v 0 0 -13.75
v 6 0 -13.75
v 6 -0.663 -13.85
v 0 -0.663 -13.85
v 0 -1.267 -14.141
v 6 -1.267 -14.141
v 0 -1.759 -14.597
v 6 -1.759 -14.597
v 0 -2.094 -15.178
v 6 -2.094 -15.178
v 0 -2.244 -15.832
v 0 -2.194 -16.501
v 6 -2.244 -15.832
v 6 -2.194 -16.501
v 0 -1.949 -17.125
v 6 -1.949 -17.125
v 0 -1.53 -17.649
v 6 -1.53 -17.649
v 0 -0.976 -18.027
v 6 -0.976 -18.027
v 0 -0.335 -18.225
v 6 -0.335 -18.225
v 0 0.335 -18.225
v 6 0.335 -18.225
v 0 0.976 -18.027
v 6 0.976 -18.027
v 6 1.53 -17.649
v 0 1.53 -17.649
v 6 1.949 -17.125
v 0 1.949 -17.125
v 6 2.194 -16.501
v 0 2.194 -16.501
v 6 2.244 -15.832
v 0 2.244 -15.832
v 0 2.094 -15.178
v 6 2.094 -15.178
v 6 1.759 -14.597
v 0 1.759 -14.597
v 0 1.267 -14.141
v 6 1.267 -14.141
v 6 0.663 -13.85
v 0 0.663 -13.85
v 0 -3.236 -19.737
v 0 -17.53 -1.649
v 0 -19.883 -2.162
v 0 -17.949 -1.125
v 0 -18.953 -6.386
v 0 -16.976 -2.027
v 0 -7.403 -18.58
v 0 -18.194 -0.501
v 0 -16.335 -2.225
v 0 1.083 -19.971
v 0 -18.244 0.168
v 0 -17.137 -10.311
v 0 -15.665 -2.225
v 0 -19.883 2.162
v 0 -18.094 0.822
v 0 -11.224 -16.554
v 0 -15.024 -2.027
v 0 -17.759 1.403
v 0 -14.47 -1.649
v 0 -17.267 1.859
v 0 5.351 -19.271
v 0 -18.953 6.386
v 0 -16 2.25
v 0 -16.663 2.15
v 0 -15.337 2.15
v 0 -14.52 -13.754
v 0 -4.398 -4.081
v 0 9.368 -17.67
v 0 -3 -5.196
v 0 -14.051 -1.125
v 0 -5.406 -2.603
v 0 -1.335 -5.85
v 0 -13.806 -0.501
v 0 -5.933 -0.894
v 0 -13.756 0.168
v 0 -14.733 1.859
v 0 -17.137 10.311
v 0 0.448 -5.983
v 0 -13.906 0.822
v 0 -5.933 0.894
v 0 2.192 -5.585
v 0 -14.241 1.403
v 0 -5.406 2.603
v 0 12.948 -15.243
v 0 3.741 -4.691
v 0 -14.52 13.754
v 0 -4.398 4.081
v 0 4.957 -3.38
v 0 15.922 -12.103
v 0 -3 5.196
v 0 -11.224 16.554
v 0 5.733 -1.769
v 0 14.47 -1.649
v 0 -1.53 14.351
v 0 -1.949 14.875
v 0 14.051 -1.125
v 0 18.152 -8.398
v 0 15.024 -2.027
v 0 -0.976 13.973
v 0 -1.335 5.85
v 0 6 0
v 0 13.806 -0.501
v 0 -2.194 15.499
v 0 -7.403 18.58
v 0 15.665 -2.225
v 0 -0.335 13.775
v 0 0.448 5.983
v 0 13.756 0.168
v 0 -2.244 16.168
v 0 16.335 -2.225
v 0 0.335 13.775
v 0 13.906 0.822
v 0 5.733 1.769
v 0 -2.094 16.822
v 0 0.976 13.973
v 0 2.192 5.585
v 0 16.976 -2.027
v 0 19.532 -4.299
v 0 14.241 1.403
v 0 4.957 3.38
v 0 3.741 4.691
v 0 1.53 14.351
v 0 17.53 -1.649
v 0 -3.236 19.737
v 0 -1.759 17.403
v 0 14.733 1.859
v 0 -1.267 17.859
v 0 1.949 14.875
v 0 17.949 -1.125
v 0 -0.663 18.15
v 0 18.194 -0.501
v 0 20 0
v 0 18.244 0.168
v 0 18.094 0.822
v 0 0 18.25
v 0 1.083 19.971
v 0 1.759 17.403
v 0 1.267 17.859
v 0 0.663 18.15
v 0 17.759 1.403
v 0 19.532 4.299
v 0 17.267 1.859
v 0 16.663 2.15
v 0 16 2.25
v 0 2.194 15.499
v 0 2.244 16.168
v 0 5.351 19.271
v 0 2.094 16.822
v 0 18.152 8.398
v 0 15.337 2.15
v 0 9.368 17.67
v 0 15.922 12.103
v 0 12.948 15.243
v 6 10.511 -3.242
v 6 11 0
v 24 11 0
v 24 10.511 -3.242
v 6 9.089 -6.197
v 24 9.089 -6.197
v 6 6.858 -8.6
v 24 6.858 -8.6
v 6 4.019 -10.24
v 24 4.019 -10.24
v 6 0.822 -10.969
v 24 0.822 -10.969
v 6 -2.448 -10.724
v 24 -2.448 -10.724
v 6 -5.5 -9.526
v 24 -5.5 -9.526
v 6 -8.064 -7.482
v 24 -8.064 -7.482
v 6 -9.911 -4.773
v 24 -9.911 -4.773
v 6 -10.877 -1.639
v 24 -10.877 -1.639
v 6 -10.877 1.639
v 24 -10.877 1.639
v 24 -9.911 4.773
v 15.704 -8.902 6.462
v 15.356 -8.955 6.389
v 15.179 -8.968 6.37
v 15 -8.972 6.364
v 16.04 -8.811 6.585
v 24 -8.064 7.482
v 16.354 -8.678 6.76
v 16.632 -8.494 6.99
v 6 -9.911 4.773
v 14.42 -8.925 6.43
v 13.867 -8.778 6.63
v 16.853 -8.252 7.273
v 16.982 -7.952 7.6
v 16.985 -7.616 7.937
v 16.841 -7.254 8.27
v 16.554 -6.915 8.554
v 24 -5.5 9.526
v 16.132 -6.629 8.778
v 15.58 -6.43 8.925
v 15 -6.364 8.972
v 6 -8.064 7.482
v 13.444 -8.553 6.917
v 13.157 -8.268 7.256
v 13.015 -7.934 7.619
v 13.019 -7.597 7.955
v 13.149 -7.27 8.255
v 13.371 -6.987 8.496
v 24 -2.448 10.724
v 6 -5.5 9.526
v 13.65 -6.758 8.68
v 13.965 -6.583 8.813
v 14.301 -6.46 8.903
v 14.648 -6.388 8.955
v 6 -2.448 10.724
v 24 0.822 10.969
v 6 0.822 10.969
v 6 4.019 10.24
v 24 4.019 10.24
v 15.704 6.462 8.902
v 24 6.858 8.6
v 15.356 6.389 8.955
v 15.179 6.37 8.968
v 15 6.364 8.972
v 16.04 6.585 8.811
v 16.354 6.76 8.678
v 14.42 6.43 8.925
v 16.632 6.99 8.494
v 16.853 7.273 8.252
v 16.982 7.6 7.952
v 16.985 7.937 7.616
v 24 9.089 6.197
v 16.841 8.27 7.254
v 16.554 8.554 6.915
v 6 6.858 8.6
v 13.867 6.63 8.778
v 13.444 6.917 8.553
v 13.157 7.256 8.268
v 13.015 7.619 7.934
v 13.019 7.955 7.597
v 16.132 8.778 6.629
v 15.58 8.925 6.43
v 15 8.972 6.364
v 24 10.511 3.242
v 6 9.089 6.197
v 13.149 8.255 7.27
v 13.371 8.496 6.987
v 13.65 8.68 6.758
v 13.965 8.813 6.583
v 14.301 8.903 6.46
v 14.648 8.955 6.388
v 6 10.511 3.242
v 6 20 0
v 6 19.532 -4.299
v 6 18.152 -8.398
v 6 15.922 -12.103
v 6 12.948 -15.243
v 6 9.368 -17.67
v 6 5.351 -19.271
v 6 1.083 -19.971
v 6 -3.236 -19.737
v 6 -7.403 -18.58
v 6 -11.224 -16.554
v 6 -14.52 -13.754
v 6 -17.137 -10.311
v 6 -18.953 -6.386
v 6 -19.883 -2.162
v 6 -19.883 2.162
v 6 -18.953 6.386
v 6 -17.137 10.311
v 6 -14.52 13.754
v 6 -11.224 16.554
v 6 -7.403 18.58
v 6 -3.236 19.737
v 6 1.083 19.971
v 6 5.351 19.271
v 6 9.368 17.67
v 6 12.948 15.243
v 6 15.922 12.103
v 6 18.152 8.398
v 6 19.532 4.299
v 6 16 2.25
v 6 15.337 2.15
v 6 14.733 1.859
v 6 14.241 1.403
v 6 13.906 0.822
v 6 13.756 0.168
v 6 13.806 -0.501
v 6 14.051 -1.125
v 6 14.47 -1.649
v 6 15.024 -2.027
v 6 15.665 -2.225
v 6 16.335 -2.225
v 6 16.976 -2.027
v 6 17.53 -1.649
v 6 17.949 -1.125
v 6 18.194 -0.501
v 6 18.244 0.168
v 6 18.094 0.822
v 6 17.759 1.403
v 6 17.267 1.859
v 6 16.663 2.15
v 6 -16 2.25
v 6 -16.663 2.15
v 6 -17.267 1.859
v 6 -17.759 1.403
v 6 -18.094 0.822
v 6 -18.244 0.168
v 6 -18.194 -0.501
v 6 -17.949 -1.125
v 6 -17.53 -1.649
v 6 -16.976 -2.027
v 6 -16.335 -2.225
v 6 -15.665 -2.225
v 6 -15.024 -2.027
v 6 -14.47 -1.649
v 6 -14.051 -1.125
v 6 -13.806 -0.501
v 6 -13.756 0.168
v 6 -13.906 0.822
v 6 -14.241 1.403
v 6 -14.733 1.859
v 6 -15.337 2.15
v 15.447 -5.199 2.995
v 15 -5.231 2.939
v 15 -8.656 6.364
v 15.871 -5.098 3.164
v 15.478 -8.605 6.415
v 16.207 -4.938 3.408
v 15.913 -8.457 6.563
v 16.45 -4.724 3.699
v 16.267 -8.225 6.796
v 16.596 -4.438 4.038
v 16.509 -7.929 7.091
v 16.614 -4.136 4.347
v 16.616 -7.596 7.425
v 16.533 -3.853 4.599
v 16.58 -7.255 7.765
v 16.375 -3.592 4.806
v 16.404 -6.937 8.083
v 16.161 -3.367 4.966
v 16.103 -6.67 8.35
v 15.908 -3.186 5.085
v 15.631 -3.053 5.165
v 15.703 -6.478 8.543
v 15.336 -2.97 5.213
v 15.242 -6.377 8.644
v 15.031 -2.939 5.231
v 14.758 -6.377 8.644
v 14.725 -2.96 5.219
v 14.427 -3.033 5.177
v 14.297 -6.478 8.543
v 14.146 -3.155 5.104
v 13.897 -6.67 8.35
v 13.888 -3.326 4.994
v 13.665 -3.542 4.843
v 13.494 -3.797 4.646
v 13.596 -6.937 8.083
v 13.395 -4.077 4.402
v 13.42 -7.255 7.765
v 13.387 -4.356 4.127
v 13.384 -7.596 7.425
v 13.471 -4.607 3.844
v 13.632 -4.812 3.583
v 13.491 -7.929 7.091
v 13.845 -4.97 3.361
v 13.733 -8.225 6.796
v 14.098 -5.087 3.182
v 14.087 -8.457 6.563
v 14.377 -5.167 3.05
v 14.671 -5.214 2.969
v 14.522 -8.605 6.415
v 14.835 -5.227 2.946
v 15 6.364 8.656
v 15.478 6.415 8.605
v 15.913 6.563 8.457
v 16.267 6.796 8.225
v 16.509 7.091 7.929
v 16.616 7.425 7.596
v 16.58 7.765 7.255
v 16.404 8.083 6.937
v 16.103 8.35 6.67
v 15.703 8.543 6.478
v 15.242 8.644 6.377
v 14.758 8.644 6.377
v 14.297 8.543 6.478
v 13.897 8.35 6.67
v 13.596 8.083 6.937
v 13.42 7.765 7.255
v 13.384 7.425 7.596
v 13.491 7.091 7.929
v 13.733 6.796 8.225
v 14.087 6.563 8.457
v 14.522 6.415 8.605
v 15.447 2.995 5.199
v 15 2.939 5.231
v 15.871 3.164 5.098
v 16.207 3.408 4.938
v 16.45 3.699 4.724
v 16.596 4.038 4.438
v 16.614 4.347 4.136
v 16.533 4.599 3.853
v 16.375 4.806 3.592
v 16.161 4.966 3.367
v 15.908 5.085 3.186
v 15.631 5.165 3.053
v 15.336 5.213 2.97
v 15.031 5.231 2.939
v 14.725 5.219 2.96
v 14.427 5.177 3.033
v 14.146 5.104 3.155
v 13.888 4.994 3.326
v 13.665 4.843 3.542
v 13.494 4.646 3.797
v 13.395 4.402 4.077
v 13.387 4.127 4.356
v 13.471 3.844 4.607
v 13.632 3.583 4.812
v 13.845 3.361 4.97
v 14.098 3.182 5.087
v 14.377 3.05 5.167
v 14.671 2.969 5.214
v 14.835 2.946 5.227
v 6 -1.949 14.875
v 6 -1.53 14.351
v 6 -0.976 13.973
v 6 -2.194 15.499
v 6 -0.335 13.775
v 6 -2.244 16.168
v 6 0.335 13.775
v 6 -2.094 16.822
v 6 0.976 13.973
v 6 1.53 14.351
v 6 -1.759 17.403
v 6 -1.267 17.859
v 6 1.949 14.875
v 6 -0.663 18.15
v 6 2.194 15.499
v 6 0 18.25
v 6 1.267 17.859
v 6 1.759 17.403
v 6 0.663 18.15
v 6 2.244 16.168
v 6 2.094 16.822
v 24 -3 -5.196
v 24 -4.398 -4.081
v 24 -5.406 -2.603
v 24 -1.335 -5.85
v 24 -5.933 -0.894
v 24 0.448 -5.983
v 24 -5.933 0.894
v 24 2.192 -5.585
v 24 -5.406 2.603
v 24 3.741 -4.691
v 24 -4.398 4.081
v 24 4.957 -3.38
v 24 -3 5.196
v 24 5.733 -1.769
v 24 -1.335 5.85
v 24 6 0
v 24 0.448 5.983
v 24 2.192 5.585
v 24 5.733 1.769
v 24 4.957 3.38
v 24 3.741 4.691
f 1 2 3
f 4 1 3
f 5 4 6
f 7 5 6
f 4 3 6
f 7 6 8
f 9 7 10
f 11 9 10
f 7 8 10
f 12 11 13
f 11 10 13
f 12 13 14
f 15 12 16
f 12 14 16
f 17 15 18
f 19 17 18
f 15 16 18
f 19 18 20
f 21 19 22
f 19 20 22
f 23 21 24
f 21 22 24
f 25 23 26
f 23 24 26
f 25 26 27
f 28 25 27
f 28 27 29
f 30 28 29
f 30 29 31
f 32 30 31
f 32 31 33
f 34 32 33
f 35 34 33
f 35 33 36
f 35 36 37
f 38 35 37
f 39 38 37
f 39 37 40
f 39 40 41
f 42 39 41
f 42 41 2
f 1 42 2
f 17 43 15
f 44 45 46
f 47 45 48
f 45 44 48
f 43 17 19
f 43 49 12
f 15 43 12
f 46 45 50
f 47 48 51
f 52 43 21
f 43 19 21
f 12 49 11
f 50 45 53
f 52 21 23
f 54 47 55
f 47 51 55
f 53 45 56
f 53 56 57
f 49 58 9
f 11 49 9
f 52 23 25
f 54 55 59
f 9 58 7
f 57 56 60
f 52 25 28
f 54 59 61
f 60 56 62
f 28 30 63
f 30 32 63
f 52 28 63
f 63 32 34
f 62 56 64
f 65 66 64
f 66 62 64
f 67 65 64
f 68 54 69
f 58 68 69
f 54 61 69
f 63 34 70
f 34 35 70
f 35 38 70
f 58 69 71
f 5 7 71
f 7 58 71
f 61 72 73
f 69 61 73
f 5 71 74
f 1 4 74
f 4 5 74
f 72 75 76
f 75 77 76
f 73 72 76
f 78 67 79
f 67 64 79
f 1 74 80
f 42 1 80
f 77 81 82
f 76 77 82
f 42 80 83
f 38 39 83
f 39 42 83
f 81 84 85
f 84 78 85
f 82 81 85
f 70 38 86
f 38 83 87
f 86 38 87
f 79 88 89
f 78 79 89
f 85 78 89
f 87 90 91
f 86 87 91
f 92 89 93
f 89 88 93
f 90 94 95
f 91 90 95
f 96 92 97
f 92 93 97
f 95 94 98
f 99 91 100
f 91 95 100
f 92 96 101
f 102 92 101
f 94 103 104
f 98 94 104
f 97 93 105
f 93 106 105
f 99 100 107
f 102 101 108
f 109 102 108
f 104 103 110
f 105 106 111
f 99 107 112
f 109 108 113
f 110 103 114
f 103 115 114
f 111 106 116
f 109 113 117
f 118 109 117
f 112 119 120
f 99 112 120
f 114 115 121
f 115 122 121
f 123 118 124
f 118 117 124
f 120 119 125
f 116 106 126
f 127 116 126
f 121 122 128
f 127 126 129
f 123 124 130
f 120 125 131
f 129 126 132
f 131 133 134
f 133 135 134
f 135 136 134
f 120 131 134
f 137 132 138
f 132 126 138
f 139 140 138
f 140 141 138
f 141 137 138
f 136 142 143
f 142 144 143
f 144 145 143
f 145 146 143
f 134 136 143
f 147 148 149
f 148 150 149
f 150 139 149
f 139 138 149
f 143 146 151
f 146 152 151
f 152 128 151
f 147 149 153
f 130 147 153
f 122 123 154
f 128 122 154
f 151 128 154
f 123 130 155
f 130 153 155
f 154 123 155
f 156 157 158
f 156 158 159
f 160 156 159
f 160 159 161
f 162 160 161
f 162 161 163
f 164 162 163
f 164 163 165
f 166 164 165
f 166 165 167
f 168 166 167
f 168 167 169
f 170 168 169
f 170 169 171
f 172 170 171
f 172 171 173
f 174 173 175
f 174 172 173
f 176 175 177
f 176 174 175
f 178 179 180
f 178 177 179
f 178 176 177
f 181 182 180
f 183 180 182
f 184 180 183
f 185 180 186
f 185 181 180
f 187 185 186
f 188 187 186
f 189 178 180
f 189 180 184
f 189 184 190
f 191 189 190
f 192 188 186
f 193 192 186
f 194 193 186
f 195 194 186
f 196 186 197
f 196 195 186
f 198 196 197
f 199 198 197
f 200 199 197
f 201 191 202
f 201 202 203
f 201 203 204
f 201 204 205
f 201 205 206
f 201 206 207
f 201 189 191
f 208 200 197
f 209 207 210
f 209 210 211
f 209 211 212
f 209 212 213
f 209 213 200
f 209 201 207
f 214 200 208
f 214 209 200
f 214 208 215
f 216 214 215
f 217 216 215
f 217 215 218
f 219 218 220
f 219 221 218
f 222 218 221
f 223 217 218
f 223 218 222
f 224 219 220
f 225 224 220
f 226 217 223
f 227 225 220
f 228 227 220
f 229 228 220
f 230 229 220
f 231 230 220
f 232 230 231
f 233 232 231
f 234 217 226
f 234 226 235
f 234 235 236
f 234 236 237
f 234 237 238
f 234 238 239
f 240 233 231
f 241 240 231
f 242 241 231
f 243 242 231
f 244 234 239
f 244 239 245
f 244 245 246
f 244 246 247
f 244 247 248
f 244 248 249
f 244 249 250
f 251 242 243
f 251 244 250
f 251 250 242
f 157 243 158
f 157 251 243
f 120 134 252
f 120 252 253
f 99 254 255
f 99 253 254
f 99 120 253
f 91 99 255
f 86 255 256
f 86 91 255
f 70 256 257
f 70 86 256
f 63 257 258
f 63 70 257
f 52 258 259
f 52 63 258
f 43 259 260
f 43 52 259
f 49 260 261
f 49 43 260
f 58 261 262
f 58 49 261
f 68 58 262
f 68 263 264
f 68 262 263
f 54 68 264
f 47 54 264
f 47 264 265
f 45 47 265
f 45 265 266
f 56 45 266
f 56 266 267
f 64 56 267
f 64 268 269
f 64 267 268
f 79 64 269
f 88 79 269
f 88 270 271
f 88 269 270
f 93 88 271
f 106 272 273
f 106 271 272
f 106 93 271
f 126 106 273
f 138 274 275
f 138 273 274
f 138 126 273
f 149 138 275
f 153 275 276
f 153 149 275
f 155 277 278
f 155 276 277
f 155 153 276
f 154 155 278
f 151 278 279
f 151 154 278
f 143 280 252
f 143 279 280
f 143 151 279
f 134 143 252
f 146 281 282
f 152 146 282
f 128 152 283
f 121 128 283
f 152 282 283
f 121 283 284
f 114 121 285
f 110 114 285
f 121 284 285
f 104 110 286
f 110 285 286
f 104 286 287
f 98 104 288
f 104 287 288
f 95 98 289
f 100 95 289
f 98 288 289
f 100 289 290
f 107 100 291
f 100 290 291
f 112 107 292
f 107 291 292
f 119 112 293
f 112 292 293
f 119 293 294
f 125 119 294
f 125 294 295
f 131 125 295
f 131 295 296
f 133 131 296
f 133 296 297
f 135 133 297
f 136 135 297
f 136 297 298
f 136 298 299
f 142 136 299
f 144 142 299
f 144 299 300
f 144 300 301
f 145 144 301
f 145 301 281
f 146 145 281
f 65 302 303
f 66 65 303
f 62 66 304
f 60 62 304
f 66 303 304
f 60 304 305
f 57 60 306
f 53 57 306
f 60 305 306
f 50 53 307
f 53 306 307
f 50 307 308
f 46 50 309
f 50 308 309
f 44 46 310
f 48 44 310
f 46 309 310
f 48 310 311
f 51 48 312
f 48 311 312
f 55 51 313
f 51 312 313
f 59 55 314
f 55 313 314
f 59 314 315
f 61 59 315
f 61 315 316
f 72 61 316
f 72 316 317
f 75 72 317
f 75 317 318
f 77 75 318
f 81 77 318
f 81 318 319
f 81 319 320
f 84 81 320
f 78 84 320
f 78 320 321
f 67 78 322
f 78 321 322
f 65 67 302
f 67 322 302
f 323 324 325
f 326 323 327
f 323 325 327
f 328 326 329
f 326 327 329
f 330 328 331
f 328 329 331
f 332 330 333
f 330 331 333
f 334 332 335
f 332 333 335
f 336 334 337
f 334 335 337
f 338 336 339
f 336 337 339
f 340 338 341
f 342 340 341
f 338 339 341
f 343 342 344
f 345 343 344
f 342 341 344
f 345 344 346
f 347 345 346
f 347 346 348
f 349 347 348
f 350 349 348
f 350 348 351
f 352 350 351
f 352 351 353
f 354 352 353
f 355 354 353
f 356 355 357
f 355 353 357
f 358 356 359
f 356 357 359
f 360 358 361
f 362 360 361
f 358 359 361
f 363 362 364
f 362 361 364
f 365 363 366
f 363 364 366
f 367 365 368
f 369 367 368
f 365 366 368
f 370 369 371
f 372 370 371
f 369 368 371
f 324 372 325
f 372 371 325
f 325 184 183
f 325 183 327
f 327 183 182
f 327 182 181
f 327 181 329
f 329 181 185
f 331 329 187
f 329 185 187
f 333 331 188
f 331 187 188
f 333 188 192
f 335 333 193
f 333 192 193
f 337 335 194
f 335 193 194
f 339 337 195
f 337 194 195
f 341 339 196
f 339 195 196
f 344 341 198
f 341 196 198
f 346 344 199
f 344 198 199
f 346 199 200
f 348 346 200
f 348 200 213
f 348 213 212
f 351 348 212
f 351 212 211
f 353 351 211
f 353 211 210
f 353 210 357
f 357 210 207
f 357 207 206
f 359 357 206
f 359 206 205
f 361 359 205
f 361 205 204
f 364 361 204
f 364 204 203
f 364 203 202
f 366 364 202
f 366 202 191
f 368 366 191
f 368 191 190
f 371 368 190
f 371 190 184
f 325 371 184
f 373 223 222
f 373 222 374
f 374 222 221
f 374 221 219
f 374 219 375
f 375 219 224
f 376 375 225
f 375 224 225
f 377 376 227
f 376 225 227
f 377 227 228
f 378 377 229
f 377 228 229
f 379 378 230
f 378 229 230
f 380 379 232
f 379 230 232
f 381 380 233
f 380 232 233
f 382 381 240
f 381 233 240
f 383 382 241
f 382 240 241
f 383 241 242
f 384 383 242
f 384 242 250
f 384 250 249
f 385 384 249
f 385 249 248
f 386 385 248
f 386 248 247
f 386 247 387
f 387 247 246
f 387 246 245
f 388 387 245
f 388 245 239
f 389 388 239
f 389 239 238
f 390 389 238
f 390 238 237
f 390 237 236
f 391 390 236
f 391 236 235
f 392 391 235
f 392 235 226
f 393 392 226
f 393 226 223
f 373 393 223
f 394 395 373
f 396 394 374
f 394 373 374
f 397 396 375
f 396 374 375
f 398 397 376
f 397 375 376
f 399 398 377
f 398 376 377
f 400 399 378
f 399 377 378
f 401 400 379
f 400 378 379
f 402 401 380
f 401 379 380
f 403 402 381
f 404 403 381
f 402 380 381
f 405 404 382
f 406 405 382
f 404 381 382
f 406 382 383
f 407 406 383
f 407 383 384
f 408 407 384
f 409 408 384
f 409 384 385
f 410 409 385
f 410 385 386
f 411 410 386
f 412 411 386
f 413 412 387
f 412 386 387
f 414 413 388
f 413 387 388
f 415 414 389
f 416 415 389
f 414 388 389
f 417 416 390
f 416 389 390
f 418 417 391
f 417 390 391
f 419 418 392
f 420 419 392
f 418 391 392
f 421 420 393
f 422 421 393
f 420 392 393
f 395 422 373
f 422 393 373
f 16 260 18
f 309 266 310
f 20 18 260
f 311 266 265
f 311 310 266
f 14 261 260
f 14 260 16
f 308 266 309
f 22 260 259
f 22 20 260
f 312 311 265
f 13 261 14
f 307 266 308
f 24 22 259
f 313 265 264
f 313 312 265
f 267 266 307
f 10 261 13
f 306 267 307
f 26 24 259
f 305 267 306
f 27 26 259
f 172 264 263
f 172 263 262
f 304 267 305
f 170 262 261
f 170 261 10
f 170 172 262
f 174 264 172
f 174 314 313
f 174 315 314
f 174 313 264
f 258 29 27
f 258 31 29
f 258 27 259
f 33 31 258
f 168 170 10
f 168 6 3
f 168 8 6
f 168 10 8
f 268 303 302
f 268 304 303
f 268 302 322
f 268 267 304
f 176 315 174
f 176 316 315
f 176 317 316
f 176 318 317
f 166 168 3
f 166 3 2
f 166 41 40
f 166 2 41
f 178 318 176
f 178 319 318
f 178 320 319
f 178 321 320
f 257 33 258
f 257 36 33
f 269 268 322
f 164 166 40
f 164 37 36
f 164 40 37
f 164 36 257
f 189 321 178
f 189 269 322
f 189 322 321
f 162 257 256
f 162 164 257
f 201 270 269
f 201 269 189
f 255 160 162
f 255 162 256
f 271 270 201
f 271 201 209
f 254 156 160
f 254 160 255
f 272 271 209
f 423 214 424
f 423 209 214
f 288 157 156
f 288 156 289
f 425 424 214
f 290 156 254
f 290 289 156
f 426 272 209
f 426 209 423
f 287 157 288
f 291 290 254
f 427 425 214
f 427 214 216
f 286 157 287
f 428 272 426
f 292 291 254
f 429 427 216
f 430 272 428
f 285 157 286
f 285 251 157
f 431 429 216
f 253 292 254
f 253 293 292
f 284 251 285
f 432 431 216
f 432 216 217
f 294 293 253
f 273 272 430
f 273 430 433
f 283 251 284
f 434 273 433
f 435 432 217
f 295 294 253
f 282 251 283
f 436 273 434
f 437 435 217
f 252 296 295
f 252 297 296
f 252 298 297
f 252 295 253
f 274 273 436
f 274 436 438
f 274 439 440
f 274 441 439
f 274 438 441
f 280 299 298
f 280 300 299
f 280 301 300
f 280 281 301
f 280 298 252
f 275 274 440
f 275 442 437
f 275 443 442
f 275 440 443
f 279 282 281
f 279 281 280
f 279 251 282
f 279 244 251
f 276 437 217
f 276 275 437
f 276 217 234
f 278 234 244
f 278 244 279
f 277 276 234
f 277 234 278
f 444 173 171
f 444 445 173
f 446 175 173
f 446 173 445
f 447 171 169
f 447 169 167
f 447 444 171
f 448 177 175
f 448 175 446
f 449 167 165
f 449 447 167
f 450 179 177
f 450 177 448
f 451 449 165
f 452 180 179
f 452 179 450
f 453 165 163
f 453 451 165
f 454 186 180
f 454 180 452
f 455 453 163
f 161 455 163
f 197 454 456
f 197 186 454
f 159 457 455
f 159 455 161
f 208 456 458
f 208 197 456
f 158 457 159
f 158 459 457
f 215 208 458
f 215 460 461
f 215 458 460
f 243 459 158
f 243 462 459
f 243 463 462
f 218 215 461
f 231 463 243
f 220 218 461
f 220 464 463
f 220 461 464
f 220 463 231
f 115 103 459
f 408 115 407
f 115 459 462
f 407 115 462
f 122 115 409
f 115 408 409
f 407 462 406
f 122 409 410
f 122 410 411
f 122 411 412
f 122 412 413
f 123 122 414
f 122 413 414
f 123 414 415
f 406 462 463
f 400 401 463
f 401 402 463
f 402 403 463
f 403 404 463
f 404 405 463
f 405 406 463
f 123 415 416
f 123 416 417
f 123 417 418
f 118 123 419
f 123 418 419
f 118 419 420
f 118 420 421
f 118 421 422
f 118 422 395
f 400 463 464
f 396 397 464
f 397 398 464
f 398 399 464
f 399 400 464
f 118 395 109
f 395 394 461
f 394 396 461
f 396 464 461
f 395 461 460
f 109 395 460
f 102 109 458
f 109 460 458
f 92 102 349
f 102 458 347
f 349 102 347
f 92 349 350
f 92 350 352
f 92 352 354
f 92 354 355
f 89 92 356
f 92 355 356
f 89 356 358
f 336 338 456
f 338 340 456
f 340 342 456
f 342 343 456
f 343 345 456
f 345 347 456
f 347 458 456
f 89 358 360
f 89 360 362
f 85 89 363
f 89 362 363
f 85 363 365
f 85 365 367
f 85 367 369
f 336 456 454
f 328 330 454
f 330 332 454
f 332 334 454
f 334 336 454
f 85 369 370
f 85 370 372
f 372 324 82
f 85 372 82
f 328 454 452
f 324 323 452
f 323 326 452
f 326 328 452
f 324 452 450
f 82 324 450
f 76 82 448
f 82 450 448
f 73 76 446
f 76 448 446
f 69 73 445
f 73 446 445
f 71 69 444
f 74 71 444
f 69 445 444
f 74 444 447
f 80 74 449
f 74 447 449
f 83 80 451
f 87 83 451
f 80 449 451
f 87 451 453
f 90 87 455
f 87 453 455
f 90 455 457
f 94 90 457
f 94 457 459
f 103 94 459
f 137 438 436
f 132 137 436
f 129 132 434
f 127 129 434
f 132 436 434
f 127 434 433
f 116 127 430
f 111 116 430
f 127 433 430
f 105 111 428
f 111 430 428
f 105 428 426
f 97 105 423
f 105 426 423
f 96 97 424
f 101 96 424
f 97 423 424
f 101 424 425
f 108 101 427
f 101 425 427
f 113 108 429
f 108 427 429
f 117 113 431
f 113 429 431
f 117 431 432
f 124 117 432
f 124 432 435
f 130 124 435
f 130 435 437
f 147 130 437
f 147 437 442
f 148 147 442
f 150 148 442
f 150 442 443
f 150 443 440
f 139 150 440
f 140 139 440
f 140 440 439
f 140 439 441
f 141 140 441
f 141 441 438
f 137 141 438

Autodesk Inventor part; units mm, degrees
ref_plane "YZ Plane" through (0, 0, 0) normal (1, 0, 0) x (0, 1, 0)
ref_plane "XZ Plane" through (0, 0, 0) normal (0, 1, 0) x (-1, 0, 0)
ref_plane "XY Plane" through (0, 0, 0) normal (0, 0, 1) x (1, 0, 0)
sketch "Sketch_1" plane through (0, 0, 0) normal (0, 0, 1) x (1, 0, 0)
  line L0 (24, 0) -> (0, 0)
  line L1 (0, 20) -> (0, 6)
  line L2 (0, 6) -> (24, 6)
  line L3 (24, 6) -> (24, 11)
  line L4 (24, 11) -> (6, 11)
  line L5 (6, 11) -> (6, 20)
  line L6 (6, 20) -> (0, 20)
revolve "Revolution1" add sketch "Sketch_1" angle 360 about axis through (24, 0, 0) along (1, 0, 0)
sketch "Sketch2" plane through (0, 0, 0) normal (-1, 0, 0) x (0, 0, 1)
  point P0 (0, 16)
hole "Hole1" at (0, 16, 0) direction (1, 0, 0) diameter 4.5 depth 6
pattern_linear "Rectangular Pattern1" count 2 spacing 22.6274 along (0, -0.7071, 0.7071) count 2 spacing 22.6274 along (0, -0.7071, -0.7071) of "Hole1"
sketch "Sketch_4" plane through (15, 0, 0) normal (1, 0, 0) x (0, 0, -1)
  line L0 (-7.7782, -7.7782) -> (-3.5355, -3.5355)
  line L1 (-3.5355, -3.5355) -> (-2.3893, -4.6818)
  line L2 (-2.3893, -4.6818) -> (-6.364, -8.6564)
  line L3 (-6.364, -8.6564) -> (-6.364, -9.1924)
  line L4 (-6.364, -9.1924) -> (-7.7782, -7.7782)
  line L5 (-7.7782, -7.7782) -> (-3.5355, -3.5355)
revolve "Revolution2" cut sketch "Sketch_4" angle 360 about axis through (15, -7.7782, 7.7782) along (0, -0.7071, 0.7071)
thread "Thread1" size "M4x0.7" class "6H" standard "ISO Metric profile" full length
sketch "Sketch_5" plane through (15, 0, 0) normal (1, 0, 0) x (0, 0, -1)
  line L0 (-7.7782, 7.7782) -> (-3.5355, 3.5355)
  line L1 (-3.5355, 3.5355) -> (-4.6818, 2.3893)
  line L2 (-4.6818, 2.3893) -> (-8.6564, 6.364)
  line L3 (-8.6564, 6.364) -> (-9.1924, 6.364)
  line L4 (-9.1924, 6.364) -> (-7.7782, 7.7782)
  line L5 (-7.7782, 7.7782) -> (-3.5355, 3.5355)
revolve "Revolution3" cut sketch "Sketch_5" angle 360 about axis through (15, 7.7782, 7.7782) along (0, 0.7071, 0.7071)
thread "Thread2" size "M4x0.7" class "6H" standard "ISO Metric profile" full length
properties part number "STHRBN12_ss"
